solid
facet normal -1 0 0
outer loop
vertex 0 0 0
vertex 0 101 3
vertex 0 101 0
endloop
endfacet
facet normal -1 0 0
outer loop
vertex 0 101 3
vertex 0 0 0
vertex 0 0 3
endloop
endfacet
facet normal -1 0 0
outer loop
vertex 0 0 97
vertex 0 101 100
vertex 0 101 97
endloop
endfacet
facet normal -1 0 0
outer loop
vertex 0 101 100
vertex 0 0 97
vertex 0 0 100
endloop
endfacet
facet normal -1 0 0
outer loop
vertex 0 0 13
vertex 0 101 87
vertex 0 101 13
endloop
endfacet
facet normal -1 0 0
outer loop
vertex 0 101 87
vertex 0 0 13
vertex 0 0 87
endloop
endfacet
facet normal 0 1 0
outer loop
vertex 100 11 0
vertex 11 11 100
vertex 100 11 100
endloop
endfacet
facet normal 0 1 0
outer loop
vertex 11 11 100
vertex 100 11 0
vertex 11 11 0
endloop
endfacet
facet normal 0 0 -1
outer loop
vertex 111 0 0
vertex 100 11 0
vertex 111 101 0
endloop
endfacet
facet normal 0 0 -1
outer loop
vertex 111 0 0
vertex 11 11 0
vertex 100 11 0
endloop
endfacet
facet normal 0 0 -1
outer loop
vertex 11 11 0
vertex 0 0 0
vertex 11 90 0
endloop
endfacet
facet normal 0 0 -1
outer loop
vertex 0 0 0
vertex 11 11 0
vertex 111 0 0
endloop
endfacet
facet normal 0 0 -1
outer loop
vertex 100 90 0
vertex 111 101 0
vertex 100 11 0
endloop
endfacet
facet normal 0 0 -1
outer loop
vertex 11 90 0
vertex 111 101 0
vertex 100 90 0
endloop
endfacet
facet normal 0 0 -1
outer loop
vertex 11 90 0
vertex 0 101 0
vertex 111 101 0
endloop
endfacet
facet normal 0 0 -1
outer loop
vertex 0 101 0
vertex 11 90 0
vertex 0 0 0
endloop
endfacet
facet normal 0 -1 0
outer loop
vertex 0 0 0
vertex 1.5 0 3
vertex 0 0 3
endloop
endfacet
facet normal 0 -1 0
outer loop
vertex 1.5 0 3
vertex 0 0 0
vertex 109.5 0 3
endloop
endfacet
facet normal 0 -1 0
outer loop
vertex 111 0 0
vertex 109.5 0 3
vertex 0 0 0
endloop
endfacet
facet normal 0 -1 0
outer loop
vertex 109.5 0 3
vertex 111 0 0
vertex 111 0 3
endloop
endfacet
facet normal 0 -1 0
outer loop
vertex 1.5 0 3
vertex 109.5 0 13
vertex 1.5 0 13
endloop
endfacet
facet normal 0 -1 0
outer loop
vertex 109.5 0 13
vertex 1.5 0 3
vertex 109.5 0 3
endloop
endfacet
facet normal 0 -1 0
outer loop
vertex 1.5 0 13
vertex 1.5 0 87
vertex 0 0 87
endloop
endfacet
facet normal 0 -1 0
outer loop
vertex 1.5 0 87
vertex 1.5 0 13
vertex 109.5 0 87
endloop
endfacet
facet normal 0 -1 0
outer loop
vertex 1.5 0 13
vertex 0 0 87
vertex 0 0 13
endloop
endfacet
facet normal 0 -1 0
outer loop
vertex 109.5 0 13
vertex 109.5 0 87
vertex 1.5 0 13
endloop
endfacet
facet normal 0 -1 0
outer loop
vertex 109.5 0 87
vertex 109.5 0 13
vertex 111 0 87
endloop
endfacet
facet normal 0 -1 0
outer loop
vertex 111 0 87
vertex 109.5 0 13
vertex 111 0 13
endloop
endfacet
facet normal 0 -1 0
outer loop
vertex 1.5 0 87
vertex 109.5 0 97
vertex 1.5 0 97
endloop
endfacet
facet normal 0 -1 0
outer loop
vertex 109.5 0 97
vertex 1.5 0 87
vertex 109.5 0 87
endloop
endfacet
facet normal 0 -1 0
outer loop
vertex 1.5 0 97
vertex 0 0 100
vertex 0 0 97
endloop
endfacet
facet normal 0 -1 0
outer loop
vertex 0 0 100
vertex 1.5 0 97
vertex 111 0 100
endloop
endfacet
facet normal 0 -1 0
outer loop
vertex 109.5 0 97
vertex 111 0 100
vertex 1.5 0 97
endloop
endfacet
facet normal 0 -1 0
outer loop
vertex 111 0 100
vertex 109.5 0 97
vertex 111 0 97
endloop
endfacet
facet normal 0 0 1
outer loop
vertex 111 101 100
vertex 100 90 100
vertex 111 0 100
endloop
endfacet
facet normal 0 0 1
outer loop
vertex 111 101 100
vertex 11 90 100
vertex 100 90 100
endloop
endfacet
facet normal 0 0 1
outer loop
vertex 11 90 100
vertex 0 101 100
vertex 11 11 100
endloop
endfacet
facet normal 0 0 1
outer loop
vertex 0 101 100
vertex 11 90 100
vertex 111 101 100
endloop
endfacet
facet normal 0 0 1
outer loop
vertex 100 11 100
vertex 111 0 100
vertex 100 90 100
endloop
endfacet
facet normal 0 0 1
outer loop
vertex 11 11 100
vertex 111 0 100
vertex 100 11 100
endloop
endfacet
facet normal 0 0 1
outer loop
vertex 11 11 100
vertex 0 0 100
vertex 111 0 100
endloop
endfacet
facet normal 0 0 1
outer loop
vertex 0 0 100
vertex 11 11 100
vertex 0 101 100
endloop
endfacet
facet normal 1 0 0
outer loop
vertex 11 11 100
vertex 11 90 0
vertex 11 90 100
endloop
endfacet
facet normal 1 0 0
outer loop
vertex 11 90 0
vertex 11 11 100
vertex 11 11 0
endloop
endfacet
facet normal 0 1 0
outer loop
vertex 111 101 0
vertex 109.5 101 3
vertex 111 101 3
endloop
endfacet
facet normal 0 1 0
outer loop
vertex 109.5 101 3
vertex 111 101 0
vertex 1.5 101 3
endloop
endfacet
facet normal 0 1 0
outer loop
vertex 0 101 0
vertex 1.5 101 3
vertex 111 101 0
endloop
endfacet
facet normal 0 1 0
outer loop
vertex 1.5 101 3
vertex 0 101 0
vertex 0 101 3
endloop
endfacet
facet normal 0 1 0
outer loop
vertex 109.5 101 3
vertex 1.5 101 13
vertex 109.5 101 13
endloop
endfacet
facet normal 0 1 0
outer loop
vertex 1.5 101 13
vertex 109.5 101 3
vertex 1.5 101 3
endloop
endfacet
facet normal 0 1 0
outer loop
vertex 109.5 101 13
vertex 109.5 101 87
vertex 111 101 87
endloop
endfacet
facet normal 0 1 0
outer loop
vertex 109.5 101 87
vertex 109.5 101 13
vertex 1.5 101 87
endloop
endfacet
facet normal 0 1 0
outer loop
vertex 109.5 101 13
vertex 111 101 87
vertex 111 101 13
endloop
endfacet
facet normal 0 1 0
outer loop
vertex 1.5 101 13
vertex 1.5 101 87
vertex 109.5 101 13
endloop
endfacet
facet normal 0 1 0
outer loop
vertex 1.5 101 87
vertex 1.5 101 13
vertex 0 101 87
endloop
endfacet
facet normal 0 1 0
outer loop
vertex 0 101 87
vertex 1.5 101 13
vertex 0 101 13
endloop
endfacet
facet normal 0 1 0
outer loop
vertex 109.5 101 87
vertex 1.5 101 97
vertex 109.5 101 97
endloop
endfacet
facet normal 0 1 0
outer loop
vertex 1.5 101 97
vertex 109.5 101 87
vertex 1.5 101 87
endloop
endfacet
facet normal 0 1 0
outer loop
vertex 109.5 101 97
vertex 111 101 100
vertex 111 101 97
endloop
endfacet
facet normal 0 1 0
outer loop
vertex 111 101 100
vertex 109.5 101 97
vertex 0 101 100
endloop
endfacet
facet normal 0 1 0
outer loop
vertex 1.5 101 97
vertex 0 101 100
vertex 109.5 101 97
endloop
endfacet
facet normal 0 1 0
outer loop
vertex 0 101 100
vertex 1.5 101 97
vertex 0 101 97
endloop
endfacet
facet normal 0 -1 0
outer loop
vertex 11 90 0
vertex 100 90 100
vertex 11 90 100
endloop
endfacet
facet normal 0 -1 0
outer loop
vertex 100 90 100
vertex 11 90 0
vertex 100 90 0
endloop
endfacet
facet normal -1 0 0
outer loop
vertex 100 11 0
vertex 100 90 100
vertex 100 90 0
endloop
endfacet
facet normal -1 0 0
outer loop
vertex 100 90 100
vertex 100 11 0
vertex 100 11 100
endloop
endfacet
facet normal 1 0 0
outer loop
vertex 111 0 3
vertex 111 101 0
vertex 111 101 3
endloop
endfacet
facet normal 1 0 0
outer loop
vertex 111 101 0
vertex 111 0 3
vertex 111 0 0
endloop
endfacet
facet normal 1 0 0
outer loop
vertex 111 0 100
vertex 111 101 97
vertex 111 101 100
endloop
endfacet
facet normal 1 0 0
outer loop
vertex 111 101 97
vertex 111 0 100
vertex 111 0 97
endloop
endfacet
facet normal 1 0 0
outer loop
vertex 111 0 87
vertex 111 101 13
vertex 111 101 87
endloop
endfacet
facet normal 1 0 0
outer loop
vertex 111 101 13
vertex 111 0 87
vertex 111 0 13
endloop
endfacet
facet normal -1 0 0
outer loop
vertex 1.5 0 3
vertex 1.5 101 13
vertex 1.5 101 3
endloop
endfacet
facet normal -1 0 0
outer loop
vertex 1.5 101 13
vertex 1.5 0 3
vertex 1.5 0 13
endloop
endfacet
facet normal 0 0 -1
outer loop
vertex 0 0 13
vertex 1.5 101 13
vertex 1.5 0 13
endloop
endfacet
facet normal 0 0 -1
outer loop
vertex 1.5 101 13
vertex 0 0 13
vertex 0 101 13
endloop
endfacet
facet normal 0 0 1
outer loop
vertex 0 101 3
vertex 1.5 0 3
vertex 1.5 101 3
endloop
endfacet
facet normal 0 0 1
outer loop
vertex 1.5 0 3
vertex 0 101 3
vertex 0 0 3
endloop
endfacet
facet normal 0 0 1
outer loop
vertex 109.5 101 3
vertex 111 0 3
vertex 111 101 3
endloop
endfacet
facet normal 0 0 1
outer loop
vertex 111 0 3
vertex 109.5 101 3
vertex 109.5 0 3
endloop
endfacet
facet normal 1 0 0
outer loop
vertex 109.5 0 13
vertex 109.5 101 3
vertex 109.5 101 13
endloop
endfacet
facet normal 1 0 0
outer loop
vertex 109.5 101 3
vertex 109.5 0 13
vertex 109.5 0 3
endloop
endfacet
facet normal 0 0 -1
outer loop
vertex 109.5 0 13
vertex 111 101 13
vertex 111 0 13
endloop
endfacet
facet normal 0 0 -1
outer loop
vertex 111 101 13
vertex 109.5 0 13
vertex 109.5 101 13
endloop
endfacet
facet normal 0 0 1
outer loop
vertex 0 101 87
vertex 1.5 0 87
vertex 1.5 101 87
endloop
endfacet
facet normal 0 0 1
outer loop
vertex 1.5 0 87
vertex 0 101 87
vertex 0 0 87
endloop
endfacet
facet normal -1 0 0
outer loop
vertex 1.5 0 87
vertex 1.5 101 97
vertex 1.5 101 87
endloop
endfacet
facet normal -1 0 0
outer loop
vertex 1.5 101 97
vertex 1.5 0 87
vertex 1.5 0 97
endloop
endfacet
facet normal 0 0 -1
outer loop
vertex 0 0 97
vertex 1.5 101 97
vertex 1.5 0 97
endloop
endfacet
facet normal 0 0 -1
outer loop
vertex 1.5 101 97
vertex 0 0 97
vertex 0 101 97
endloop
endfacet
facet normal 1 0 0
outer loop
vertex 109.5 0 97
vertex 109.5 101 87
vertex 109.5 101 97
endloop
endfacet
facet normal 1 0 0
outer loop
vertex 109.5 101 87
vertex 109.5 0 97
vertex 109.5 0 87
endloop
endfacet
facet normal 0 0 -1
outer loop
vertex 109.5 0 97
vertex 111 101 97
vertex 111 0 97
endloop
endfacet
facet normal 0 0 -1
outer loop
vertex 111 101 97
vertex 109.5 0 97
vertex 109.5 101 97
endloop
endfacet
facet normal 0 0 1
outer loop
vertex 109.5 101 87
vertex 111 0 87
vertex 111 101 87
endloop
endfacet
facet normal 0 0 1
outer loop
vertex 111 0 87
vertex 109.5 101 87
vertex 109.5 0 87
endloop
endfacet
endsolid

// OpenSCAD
// file: cube_base.scad
input_length = 10;
input_height = 10;
input_depth = 10;
box_size = 1;

module box(input_length, input_depth, input_height, box_size){
	length = input_length;
	height = input_height - box_size;
	depth = input_depth;

	bottom_back_left =   [0,      0,     0];
	top_back_left =      [0,      0,     height];
	bottom_front_left =  [0,      depth, 0];
	top_front_left =     [0,      depth, height];
	bottom_back_right =  [length, 0,     0];
	top_back_right =     [length, 0,     height];
	bottom_front_right = [length, depth, 0];
	top_front_right =    [length, depth, height];

	box = [bottom_back_left, top_back_left, bottom_front_left, top_front_left, bottom_back_right, top_back_right, bottom_front_right, top_front_right];

	hull(){
		for(position = box){
			translate(position){
				cube(box_size);
			}
		}
	}
}

box(input_length, input_depth, input_height, box_size);
// main file
//Includes 
use <../base/cube_base.scad>

//Model information
model_length = 10;
model_depth = 10;
model_height = 10;
model_offset = 0;
rail_depth = .5;
rail_height = 3;
rail_thickness = 10;
box_height = 1;
model_opening = 0;
model_slack = 10;
hopper_height = 100;
hopper_wall_thickness = 10;

/*
translate([model_offset, model_offset, 0]){
	box(model_length, model_depth, model_height, 1);
}
*/

module hopper(model_length, model_depth, model_height, model_opening, rail_depth, rail_height, rail_thickness, hopper_height, hopper_wall_thickness, box_height, model_slack){
	//Calculated
	wall_length_calc = model_length * model_slack;
	model_depth_calc = model_depth * model_slack;
	model_height_calc = model_height * model_slack;

	//Wall 
	wall_length = [wall_length_calc, hopper_wall_thickness, wall_length_calc, hopper_wall_thickness];
	wall_depth = [hopper_wall_thickness, model_depth_calc, hopper_wall_thickness, model_depth_calc];
	wall_height = [hopper_height, hopper_height, hopper_height -model_opening, hopper_height];
	wall_box_height = [box_height, box_height, box_height, box_height];
	wall_offset = [
	[0, 0, 0],
	[0, 0, 0],
	[0, model_depth_calc - hopper_wall_thickness, model_opening],
	[wall_length_calc, 0, 0]
	];

	wall = [
	wall_length,
	wall_depth,
	wall_height,
	wall_box_height,
	wall_offset
	];
	
	//Rail
	rail = [
	rail_depth,
	model_depth_calc,
	rail_thickness
	];
	rail_offset_1 = [
	0,
	0,
	rail_height
	];
	rail_offset_2 = [
	wall_length_calc + hopper_wall_thickness -rail_depth,
	0,
	rail_height
	];
	rail_offset_3 = [
	0,
	0,
	hopper_height - rail_height - rail_thickness
	];
	rail_offset_4 = [
	wall_length_calc + hopper_wall_thickness -rail_depth,
	0,
	hopper_height - rail_height - rail_thickness
	];
	rail_offsets = [rail_offset_1, rail_offset_2, rail_offset_3, rail_offset_4];
	
	difference(){
		for(segment = [0:3]){
			translate(wall[4][segment]){
				box(wall[0][segment], wall[1][segment], wall[2][segment], wall[3][segment]);
			}
		}
		for(rail_offset = rail_offsets){
			translate(rail_offset){
				box(rail[0], rail[1], rail[2], 1);
			}
		}
	}
}
hopper(model_length, model_depth, model_height, model_opening, rail_depth, rail_height, rail_thickness, hopper_height, hopper_wall_thickness, box_height, model_slack);
